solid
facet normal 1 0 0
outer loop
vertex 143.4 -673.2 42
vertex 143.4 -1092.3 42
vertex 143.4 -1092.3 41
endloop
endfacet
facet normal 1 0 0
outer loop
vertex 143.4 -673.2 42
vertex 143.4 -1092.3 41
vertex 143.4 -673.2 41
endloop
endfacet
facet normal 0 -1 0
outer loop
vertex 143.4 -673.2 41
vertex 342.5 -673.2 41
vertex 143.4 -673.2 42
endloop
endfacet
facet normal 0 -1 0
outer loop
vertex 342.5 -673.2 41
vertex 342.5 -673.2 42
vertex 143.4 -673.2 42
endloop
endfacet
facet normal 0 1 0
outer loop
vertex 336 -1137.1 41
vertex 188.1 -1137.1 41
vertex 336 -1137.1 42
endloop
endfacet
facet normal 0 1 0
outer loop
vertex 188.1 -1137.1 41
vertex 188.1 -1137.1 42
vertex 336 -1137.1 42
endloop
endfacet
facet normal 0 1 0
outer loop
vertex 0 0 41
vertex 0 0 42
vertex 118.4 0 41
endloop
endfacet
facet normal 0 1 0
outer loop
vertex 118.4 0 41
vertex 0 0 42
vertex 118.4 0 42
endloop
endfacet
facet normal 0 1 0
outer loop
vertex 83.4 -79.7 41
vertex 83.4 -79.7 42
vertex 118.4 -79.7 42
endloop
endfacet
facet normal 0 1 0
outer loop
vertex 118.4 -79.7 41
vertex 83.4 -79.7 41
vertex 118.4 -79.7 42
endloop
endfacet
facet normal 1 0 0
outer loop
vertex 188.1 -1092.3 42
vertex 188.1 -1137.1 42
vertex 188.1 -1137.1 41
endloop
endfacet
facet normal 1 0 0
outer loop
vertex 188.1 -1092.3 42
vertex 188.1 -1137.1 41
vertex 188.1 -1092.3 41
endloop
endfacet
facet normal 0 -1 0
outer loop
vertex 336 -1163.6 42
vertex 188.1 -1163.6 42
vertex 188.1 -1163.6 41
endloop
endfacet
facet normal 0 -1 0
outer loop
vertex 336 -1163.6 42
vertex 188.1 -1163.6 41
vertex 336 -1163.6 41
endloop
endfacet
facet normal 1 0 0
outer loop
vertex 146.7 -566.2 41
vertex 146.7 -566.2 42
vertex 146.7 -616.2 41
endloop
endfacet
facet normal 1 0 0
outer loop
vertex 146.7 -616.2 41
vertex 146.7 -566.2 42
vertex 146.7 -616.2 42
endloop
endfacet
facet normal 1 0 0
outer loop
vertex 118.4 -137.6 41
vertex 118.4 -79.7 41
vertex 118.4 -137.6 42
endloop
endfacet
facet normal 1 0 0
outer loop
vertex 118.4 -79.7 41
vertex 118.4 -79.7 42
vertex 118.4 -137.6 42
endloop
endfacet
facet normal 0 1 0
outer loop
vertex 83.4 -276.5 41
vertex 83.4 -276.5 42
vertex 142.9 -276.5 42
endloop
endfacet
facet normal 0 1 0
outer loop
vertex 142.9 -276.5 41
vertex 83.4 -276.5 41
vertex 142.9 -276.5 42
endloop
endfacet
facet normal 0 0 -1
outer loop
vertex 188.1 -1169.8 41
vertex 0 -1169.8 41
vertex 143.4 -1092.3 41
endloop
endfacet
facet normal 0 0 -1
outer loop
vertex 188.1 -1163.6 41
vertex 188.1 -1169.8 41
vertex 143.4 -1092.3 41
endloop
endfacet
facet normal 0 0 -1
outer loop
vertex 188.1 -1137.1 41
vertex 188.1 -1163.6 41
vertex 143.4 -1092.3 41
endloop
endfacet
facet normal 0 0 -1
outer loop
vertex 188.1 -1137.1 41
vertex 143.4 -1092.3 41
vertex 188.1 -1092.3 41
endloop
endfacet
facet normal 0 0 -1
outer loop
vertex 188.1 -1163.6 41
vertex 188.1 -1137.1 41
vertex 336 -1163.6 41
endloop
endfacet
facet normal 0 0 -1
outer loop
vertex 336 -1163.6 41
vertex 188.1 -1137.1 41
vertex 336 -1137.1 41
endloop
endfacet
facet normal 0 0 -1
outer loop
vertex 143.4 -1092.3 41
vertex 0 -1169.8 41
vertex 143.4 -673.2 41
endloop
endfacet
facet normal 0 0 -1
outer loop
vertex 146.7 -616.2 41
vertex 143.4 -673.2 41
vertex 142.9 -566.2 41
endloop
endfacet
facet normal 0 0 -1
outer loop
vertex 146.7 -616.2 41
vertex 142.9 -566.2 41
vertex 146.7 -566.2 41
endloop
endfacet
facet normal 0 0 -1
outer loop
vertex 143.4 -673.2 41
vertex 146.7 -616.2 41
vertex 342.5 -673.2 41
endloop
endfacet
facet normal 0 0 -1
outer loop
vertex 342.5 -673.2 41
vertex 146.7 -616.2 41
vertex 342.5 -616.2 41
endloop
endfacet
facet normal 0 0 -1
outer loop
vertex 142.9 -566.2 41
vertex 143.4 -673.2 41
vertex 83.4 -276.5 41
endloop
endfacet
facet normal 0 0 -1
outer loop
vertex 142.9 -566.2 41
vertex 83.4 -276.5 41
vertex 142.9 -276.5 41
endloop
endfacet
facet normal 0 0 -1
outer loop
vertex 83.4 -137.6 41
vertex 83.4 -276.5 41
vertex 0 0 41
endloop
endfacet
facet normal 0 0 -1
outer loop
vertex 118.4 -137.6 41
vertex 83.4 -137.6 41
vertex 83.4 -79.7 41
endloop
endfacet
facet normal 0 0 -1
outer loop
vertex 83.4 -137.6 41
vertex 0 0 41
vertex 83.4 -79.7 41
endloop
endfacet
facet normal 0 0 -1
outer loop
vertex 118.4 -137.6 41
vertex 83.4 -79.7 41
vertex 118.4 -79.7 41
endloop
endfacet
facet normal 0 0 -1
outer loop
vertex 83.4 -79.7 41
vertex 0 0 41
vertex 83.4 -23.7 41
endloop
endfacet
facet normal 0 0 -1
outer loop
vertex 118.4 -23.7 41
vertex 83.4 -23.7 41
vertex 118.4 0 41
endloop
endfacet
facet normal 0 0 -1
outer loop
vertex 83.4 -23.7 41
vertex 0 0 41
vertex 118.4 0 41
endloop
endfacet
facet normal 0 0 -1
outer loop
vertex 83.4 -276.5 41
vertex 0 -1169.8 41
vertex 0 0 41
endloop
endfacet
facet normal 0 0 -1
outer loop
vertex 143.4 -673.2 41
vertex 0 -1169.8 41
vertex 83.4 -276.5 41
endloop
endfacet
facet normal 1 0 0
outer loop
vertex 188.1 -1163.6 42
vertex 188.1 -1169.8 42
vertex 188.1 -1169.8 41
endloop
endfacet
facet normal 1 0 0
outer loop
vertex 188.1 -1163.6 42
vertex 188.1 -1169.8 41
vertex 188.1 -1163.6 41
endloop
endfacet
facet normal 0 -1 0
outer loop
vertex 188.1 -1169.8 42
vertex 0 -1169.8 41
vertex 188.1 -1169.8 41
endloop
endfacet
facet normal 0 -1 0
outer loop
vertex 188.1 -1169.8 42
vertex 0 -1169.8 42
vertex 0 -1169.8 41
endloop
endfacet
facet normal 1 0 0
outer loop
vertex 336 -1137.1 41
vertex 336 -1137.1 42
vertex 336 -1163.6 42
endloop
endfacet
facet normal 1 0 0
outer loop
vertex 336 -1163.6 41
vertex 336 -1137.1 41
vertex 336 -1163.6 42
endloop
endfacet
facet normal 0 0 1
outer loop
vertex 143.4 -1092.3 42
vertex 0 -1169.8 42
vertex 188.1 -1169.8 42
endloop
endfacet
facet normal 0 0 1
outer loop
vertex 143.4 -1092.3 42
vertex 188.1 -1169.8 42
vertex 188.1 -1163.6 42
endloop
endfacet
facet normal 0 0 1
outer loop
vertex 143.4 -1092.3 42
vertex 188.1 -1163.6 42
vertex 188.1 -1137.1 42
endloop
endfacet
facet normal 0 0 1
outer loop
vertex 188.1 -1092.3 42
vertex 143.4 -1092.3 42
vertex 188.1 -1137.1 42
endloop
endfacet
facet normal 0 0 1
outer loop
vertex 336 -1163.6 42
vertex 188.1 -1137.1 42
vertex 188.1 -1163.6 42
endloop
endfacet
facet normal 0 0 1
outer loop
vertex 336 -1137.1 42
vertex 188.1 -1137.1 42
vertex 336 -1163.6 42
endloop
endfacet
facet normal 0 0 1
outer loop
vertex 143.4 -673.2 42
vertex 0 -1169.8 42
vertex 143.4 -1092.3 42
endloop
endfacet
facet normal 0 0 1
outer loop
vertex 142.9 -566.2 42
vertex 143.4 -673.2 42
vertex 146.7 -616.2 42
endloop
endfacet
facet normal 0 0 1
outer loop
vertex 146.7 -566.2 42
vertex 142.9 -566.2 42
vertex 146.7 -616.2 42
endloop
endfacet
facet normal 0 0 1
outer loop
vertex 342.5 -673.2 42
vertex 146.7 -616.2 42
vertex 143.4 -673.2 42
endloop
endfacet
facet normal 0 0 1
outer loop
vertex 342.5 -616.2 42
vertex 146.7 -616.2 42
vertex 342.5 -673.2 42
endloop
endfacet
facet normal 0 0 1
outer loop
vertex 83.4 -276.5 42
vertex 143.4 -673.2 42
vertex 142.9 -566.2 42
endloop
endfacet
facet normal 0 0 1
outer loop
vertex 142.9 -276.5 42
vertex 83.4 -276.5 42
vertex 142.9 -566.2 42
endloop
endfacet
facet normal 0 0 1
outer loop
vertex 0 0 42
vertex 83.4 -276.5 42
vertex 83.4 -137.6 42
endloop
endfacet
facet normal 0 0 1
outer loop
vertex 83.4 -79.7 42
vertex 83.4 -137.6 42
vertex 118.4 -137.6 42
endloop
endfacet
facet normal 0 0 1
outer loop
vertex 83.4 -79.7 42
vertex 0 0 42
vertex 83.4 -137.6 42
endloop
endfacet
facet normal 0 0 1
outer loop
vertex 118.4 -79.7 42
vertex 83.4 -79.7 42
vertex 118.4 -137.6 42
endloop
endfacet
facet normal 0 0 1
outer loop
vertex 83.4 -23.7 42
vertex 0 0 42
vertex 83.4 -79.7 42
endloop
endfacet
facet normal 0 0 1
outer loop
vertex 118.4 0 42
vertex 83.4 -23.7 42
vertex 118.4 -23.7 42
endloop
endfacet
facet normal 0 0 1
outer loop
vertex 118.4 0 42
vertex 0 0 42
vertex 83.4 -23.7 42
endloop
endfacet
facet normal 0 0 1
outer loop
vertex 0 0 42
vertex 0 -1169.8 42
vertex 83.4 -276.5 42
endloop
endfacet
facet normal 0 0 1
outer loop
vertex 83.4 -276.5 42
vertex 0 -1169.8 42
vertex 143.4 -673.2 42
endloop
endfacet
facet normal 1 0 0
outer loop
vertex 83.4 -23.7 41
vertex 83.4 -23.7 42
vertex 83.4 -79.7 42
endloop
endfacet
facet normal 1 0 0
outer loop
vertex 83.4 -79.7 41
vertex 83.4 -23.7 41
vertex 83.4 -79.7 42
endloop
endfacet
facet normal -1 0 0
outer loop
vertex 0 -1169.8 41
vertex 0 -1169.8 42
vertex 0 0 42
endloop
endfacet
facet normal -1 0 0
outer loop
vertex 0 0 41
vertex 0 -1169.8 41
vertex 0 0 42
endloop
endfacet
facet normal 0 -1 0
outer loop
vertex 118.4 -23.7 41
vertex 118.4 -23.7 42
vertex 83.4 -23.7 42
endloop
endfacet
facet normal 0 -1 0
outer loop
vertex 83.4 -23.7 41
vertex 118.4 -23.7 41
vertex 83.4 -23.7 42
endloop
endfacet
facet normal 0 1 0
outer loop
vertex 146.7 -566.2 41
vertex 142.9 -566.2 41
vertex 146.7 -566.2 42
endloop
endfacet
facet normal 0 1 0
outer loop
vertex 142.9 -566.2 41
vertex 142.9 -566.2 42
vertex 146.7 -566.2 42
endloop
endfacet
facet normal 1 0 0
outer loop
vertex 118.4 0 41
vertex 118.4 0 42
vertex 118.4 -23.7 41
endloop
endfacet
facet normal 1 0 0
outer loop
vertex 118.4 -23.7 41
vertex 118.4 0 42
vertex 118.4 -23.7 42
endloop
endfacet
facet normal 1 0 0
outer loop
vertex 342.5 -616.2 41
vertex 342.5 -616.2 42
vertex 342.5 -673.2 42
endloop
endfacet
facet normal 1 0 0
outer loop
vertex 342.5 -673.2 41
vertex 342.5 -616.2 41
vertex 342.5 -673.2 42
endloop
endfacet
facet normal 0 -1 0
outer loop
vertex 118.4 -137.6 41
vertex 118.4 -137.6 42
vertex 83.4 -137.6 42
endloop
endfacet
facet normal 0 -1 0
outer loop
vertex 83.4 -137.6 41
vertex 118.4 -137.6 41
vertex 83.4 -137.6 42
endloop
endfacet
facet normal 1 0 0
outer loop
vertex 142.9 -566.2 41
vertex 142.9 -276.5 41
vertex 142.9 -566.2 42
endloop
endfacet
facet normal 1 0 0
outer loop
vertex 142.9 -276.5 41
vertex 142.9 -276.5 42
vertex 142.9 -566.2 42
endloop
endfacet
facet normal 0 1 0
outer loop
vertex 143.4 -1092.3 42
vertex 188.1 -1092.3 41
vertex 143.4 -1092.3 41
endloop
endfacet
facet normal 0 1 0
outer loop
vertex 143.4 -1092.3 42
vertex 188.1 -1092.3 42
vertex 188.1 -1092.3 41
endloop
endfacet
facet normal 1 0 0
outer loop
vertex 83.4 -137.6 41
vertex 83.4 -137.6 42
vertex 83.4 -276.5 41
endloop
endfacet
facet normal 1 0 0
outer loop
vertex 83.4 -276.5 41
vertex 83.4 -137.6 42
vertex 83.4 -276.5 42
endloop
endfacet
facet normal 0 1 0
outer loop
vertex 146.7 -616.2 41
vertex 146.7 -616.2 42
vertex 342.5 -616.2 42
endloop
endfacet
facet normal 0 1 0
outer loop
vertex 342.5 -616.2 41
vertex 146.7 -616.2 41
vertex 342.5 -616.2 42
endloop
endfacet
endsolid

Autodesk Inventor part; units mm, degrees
ref_plane "YZ Plane" through (0, 0, 0) normal (1, 0, 0) x (0, 1, 0)
ref_plane "XZ Plane" through (0, 0, 0) normal (0, 1, 0) x (-1, 0, 0)
ref_plane "工作平面1" through (0, 0, 42) normal (0, 0, 1) x (1, 0, 0)
sketch "草图1" plane through (0, 0, 42) normal (0, 0, 1) x (1, 0, 0)
  line L0 (0, 0) -> (60, 0)
  line L1 (60, 0) -> (60, -1169.8)
  line L2 (60, -1169.8) -> (0, -1169.8)
  line L3 (0, -1169.8) -> (0, 0)
  line L4 (0, -80.6) -> (60, -80.6)
  line L5 (0, -191.9) -> (60, -191.9)
  line L6 (0, -276.5) -> (60, -276.5)
  line L7 (0, -335.9) -> (60, -335.9)
  line L8 (0, -420.6) -> (60, -420.6)
  line L9 (0, -550.6) -> (60, -550.6)
  line L10 (0, -677.8) -> (60, -677.8)
  line L11 (0, -782.9) -> (60, -782.9)
  line L12 (0, -839.5) -> (60, -839.5)
  line L13 (0, -923.6) -> (60, -923.6)
  line L14 (0, -1007.7) -> (60, -1007.7)
  line L15 (0, -1091.2) -> (60, -1091.2)
  line L16 (60, 0) -> (118.4, 0)
  line L17 (118.4, 0) -> (118.4, -23.7)
  line L18 (118.4, -23.7) -> (83.4, -23.7)
  line L19 (83.4, -23.7) -> (83.4, -79.7)
  line L20 (83.4, -79.7) -> (118.4, -79.7)
  line L21 (118.4, -79.7) -> (118.4, -137.6)
  line L22 (118.4, -137.6) -> (83.4, -137.6)
  line L23 (83.4, -137.6) -> (83.4, -276.5)
  line L24 (83.4, -276.5) -> (142.9, -276.5)
  line L25 (142.9, -276.5) -> (142.9, -379.5)
  line L26 (83.4, -276.5) -> (83.4, -379.5)
  line L27 (83.4, -379.5) -> (142.9, -379.5)
  line L28 (142.9, -379.5) -> (142.9, -463)
  line L29 (142.9, -463) -> (83.4, -463)
  line L30 (83.4, -463) -> (83.4, -379.5)
  line L31 (142.9, -463) -> (142.9, -566.2)
  line L32 (142.9, -566.2) -> (83.4, -566.2)
  line L33 (83.4, -566.2) -> (83.4, -463)
  line L34 (142.9, -566.2) -> (146.7, -566.2)
  line L35 (146.7, -566.2) -> (146.7, -616.2)
  line L36 (146.7, -616.2) -> (192.5, -616.2)
  line L37 (192.5, -616.2) -> (192.5, -673.2)
  line L38 (192.5, -616.2) -> (342.5, -616.2)
  line L39 (342.5, -616.2) -> (342.5, -673.2)
  line L40 (342.5, -673.2) -> (143.4, -673.2)
  line L41 (143.4, -673.2) -> (83.4, -673.2)
  line L42 (83.4, -673.2) -> (83.4, -1092.3)
  line L43 (83.4, -1092.3) -> (143.4, -1092.3)
  line L44 (143.4, -1092.3) -> (143.4, -673.2)
  line L45 (83.4, -754.3) -> (143.4, -754.3)
  line L46 (143.4, -837.8) -> (83.4, -837.8)
  line L47 (83.4, -893.6) -> (143.4, -893.6)
  line L48 (143.4, -978.3) -> (83.4, -978.3)
  line L49 (60, -1169.8) -> (188.1, -1169.8)
  line L50 (188.1, -1169.8) -> (188.1, -1092.3)
  line L51 (188.1, -1092.3) -> (143.4, -1092.3)
  line L52 (83.4, -1092.3) -> (83.4, -1117.3)
  line L53 (83.4, -1117.3) -> (188.1, -1117.3)
  line L54 (98.6, -1092.3) -> (98.6, -1117.3)
  line L55 (114.5, -1092.3) -> (114.5, -1117.3)
  line L56 (143.4, -1092.3) -> (143.4, -1117.3)
  line L57 (166.2, -1092.3) -> (166.2, -1117.3)
  line L58 (188.1, -1163.6) -> (336, -1163.6)
  line L59 (188.1, -1137.1) -> (336, -1137.1)
  line L60 (336, -1137.1) -> (336, -1163.6)
  dimension "d1" = 60
  dimension "d2" = 80.6
  dimension "d3" = 111.3
  dimension "d4" = 84.6
  dimension "d5" = 59.4
  dimension "d6" = 84.7
  dimension "d7" = 130
  dimension "d8" = 127.2
  dimension "d9" = 105.1
  dimension "d10" = 56.6
  dimension "d11" = 84.1
  dimension "d12" = 84.1
  dimension "d13" = 83.5
  dimension "d14" = 78.6
  dimension "d15" = 58.4
  dimension "d16" = 23.7
  dimension "d17" = 35
  dimension "d18" = 56
  dimension "d19" = 57.9
  dimension "d20" = 35
  dimension "d21" = 138.9
  dimension "d22" = 59.5
  dimension "d23" = 103
  dimension "d24" = 83.5
  dimension "d25" = 103.2
  dimension "d26" = 59.5
  dimension "d27" = 3.8
  dimension "d28" = 50
  dimension "d29" = 45.8
  dimension "d30" = 57
  dimension "d31" = 150
  dimension "d32" = 57
  dimension "d33" = 199.1
  dimension "d34" = 60
  dimension "d36" = 81.1
  dimension "d37" = 83.5
  dimension "d38" = 55.8
  dimension "d39" = 84.7
  dimension "d40" = 114
  dimension "d41" = 128.1
  dimension "d42" = 25
  dimension "d43" = 15.2
  dimension "d44" = 15.9
  dimension "d45" = 28.9
  dimension "d46" = 22.8
  dimension "d47" = 21.9
  dimension "d48" = 147.9
  dimension "d49" = 6.2
  dimension "d50" = 26.5
extrude "拉伸1" add sketch "草图1" against normal blind 1
properties part number "LabVIEWM0.5"
